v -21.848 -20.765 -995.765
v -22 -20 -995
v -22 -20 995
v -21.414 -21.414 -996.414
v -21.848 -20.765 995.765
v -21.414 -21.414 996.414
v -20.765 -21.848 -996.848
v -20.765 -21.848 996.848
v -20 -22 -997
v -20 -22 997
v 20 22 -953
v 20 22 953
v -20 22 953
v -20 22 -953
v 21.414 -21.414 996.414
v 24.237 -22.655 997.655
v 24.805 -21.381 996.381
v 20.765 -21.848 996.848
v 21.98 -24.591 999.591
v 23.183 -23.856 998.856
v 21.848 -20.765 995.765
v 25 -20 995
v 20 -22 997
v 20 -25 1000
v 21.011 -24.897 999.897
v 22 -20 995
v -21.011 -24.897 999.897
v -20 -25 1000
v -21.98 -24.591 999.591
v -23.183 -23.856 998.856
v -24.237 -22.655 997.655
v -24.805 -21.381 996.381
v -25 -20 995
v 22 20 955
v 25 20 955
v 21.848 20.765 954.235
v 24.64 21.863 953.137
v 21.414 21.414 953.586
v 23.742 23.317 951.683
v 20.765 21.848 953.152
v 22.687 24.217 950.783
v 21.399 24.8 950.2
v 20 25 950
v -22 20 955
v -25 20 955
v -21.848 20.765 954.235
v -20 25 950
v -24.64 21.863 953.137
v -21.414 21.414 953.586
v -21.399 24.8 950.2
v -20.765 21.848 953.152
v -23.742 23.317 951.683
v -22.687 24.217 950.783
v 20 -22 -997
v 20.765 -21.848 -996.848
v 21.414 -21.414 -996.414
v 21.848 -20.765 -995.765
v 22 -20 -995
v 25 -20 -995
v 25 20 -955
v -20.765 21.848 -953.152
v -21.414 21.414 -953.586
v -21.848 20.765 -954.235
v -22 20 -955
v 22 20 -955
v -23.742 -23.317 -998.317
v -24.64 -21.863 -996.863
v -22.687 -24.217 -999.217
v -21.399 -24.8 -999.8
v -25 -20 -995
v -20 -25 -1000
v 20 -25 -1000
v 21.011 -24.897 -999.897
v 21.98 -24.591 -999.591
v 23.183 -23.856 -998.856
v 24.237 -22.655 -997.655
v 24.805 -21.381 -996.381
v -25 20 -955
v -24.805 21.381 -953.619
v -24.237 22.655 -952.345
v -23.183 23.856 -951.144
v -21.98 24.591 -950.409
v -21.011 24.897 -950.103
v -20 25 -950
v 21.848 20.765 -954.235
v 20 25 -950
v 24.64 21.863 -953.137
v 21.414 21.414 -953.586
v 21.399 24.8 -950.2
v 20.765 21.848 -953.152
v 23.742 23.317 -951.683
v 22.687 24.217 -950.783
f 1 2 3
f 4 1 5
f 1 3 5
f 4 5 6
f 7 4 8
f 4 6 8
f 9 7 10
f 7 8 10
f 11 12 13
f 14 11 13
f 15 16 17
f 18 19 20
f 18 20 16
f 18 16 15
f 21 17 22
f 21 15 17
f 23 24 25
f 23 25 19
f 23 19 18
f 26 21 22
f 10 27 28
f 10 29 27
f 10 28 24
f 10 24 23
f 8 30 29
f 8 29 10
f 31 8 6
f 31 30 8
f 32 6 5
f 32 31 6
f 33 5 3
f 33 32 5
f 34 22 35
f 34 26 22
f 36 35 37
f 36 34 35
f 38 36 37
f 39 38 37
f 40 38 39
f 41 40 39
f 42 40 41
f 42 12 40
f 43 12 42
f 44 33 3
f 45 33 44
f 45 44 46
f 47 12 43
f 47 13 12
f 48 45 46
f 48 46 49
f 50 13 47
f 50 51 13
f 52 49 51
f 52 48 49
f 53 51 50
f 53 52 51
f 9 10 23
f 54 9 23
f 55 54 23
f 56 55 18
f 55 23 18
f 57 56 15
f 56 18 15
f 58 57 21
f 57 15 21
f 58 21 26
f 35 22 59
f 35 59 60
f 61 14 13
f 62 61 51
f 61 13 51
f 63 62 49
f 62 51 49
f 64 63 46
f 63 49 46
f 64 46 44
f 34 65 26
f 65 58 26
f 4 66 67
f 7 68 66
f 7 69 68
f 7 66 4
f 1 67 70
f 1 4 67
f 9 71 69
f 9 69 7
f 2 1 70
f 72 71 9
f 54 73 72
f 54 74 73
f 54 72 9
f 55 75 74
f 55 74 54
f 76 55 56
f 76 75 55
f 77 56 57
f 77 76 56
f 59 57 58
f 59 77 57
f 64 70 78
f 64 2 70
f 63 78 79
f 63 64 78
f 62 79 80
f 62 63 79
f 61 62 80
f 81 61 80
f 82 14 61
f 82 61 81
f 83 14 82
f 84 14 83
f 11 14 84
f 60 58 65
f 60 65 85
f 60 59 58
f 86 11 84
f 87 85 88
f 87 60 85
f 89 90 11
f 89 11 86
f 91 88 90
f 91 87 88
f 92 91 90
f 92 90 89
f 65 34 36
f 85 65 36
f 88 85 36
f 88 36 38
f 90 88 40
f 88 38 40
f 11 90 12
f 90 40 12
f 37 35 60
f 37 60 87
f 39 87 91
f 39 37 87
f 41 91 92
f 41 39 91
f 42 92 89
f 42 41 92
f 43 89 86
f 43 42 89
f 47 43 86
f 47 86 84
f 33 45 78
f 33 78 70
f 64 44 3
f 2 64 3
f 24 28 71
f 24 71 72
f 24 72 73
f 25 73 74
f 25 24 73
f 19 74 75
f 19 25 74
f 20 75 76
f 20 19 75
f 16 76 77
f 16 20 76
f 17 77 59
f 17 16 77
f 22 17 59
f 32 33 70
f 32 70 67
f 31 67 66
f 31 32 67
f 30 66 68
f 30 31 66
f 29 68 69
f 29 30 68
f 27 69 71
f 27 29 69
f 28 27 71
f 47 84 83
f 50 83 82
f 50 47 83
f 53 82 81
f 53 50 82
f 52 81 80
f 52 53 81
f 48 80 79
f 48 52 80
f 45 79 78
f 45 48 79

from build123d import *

# Parameters (mm, degrees)
F1_DEPTH      = 1000
F3_DEPTH      = 2000.001
F5_DEPTH      = 25.001
F5_DEPTH_BACK = 25


# Not quite as in the source:
# - a pattern or mirror of a feature is missing from the dataset's text; its kind, count and spacing are read off the source's solid


with BuildPart() as f1:
    # F0 (on Top) → F1 (new body, symmetric)
    with BuildSketch(Plane.XY):
        with BuildLine():
            ThreePointArc((25, 20), (23.5355339059, 23.5355339059), (20, 25))
            Line((20, 25), (-20, 25))
            ThreePointArc((-20, 25), (-23.5355339059, 23.5355339059), (-25, 20))
            Line((-25, 20), (-25, -20))
            ThreePointArc((-25, -20), (-23.5355339059, -23.5355339059), (-20, -25))
            Line((-20, -25), (20, -25))
            ThreePointArc((20, -25), (23.5355339059, -23.5355339059), (25, -20))
            Line((25, -20), (25, 20))
        make_face()
    extrude(amount=F1_DEPTH, both=True)

    # F2 (on face) → F3 (cut, through all)
    with BuildSketch(Plane.XY.offset(1000)):
        with BuildLine():
            ThreePointArc((-22, -20), (-21.4142135624, -21.4142135624), (-20, -22))
            Line((-20, -22), (20, -22))
            ThreePointArc((20, -22), (21.4142135624, -21.4142135624), (22, -20))
            Line((22, -20), (22, 20))
            ThreePointArc((22, 20), (21.4142135624, 21.4142135624), (20, 22))
            Line((20, 22), (-20, 22))
            ThreePointArc((-20, 22), (-21.4142135624, 21.4142135624), (-22, 20))
            Line((-22, 20), (-22, -20))
        make_face()
    extrude(amount=-F3_DEPTH, mode=Mode.SUBTRACT)

    # F4 (on Right) → F5 (cut, two sides)
    with BuildSketch(Plane.YZ) as f5_sk:
        Polygon((25, 1000), (-25, 1000), (25, 950), align=None)
    f5 = extrude(amount=-F5_DEPTH, mode=Mode.SUBTRACT) + extrude(f5_sk.sketch, amount=F5_DEPTH_BACK, mode=Mode.SUBTRACT)

    # F5_copies: F5 across plane
    add(f5.mirror(Plane(origin=(0, 0, 0), x_dir=(-1, 0, 0), z_dir=(0, 0, -1))), mode=Mode.SUBTRACT)


solid = f1.part
